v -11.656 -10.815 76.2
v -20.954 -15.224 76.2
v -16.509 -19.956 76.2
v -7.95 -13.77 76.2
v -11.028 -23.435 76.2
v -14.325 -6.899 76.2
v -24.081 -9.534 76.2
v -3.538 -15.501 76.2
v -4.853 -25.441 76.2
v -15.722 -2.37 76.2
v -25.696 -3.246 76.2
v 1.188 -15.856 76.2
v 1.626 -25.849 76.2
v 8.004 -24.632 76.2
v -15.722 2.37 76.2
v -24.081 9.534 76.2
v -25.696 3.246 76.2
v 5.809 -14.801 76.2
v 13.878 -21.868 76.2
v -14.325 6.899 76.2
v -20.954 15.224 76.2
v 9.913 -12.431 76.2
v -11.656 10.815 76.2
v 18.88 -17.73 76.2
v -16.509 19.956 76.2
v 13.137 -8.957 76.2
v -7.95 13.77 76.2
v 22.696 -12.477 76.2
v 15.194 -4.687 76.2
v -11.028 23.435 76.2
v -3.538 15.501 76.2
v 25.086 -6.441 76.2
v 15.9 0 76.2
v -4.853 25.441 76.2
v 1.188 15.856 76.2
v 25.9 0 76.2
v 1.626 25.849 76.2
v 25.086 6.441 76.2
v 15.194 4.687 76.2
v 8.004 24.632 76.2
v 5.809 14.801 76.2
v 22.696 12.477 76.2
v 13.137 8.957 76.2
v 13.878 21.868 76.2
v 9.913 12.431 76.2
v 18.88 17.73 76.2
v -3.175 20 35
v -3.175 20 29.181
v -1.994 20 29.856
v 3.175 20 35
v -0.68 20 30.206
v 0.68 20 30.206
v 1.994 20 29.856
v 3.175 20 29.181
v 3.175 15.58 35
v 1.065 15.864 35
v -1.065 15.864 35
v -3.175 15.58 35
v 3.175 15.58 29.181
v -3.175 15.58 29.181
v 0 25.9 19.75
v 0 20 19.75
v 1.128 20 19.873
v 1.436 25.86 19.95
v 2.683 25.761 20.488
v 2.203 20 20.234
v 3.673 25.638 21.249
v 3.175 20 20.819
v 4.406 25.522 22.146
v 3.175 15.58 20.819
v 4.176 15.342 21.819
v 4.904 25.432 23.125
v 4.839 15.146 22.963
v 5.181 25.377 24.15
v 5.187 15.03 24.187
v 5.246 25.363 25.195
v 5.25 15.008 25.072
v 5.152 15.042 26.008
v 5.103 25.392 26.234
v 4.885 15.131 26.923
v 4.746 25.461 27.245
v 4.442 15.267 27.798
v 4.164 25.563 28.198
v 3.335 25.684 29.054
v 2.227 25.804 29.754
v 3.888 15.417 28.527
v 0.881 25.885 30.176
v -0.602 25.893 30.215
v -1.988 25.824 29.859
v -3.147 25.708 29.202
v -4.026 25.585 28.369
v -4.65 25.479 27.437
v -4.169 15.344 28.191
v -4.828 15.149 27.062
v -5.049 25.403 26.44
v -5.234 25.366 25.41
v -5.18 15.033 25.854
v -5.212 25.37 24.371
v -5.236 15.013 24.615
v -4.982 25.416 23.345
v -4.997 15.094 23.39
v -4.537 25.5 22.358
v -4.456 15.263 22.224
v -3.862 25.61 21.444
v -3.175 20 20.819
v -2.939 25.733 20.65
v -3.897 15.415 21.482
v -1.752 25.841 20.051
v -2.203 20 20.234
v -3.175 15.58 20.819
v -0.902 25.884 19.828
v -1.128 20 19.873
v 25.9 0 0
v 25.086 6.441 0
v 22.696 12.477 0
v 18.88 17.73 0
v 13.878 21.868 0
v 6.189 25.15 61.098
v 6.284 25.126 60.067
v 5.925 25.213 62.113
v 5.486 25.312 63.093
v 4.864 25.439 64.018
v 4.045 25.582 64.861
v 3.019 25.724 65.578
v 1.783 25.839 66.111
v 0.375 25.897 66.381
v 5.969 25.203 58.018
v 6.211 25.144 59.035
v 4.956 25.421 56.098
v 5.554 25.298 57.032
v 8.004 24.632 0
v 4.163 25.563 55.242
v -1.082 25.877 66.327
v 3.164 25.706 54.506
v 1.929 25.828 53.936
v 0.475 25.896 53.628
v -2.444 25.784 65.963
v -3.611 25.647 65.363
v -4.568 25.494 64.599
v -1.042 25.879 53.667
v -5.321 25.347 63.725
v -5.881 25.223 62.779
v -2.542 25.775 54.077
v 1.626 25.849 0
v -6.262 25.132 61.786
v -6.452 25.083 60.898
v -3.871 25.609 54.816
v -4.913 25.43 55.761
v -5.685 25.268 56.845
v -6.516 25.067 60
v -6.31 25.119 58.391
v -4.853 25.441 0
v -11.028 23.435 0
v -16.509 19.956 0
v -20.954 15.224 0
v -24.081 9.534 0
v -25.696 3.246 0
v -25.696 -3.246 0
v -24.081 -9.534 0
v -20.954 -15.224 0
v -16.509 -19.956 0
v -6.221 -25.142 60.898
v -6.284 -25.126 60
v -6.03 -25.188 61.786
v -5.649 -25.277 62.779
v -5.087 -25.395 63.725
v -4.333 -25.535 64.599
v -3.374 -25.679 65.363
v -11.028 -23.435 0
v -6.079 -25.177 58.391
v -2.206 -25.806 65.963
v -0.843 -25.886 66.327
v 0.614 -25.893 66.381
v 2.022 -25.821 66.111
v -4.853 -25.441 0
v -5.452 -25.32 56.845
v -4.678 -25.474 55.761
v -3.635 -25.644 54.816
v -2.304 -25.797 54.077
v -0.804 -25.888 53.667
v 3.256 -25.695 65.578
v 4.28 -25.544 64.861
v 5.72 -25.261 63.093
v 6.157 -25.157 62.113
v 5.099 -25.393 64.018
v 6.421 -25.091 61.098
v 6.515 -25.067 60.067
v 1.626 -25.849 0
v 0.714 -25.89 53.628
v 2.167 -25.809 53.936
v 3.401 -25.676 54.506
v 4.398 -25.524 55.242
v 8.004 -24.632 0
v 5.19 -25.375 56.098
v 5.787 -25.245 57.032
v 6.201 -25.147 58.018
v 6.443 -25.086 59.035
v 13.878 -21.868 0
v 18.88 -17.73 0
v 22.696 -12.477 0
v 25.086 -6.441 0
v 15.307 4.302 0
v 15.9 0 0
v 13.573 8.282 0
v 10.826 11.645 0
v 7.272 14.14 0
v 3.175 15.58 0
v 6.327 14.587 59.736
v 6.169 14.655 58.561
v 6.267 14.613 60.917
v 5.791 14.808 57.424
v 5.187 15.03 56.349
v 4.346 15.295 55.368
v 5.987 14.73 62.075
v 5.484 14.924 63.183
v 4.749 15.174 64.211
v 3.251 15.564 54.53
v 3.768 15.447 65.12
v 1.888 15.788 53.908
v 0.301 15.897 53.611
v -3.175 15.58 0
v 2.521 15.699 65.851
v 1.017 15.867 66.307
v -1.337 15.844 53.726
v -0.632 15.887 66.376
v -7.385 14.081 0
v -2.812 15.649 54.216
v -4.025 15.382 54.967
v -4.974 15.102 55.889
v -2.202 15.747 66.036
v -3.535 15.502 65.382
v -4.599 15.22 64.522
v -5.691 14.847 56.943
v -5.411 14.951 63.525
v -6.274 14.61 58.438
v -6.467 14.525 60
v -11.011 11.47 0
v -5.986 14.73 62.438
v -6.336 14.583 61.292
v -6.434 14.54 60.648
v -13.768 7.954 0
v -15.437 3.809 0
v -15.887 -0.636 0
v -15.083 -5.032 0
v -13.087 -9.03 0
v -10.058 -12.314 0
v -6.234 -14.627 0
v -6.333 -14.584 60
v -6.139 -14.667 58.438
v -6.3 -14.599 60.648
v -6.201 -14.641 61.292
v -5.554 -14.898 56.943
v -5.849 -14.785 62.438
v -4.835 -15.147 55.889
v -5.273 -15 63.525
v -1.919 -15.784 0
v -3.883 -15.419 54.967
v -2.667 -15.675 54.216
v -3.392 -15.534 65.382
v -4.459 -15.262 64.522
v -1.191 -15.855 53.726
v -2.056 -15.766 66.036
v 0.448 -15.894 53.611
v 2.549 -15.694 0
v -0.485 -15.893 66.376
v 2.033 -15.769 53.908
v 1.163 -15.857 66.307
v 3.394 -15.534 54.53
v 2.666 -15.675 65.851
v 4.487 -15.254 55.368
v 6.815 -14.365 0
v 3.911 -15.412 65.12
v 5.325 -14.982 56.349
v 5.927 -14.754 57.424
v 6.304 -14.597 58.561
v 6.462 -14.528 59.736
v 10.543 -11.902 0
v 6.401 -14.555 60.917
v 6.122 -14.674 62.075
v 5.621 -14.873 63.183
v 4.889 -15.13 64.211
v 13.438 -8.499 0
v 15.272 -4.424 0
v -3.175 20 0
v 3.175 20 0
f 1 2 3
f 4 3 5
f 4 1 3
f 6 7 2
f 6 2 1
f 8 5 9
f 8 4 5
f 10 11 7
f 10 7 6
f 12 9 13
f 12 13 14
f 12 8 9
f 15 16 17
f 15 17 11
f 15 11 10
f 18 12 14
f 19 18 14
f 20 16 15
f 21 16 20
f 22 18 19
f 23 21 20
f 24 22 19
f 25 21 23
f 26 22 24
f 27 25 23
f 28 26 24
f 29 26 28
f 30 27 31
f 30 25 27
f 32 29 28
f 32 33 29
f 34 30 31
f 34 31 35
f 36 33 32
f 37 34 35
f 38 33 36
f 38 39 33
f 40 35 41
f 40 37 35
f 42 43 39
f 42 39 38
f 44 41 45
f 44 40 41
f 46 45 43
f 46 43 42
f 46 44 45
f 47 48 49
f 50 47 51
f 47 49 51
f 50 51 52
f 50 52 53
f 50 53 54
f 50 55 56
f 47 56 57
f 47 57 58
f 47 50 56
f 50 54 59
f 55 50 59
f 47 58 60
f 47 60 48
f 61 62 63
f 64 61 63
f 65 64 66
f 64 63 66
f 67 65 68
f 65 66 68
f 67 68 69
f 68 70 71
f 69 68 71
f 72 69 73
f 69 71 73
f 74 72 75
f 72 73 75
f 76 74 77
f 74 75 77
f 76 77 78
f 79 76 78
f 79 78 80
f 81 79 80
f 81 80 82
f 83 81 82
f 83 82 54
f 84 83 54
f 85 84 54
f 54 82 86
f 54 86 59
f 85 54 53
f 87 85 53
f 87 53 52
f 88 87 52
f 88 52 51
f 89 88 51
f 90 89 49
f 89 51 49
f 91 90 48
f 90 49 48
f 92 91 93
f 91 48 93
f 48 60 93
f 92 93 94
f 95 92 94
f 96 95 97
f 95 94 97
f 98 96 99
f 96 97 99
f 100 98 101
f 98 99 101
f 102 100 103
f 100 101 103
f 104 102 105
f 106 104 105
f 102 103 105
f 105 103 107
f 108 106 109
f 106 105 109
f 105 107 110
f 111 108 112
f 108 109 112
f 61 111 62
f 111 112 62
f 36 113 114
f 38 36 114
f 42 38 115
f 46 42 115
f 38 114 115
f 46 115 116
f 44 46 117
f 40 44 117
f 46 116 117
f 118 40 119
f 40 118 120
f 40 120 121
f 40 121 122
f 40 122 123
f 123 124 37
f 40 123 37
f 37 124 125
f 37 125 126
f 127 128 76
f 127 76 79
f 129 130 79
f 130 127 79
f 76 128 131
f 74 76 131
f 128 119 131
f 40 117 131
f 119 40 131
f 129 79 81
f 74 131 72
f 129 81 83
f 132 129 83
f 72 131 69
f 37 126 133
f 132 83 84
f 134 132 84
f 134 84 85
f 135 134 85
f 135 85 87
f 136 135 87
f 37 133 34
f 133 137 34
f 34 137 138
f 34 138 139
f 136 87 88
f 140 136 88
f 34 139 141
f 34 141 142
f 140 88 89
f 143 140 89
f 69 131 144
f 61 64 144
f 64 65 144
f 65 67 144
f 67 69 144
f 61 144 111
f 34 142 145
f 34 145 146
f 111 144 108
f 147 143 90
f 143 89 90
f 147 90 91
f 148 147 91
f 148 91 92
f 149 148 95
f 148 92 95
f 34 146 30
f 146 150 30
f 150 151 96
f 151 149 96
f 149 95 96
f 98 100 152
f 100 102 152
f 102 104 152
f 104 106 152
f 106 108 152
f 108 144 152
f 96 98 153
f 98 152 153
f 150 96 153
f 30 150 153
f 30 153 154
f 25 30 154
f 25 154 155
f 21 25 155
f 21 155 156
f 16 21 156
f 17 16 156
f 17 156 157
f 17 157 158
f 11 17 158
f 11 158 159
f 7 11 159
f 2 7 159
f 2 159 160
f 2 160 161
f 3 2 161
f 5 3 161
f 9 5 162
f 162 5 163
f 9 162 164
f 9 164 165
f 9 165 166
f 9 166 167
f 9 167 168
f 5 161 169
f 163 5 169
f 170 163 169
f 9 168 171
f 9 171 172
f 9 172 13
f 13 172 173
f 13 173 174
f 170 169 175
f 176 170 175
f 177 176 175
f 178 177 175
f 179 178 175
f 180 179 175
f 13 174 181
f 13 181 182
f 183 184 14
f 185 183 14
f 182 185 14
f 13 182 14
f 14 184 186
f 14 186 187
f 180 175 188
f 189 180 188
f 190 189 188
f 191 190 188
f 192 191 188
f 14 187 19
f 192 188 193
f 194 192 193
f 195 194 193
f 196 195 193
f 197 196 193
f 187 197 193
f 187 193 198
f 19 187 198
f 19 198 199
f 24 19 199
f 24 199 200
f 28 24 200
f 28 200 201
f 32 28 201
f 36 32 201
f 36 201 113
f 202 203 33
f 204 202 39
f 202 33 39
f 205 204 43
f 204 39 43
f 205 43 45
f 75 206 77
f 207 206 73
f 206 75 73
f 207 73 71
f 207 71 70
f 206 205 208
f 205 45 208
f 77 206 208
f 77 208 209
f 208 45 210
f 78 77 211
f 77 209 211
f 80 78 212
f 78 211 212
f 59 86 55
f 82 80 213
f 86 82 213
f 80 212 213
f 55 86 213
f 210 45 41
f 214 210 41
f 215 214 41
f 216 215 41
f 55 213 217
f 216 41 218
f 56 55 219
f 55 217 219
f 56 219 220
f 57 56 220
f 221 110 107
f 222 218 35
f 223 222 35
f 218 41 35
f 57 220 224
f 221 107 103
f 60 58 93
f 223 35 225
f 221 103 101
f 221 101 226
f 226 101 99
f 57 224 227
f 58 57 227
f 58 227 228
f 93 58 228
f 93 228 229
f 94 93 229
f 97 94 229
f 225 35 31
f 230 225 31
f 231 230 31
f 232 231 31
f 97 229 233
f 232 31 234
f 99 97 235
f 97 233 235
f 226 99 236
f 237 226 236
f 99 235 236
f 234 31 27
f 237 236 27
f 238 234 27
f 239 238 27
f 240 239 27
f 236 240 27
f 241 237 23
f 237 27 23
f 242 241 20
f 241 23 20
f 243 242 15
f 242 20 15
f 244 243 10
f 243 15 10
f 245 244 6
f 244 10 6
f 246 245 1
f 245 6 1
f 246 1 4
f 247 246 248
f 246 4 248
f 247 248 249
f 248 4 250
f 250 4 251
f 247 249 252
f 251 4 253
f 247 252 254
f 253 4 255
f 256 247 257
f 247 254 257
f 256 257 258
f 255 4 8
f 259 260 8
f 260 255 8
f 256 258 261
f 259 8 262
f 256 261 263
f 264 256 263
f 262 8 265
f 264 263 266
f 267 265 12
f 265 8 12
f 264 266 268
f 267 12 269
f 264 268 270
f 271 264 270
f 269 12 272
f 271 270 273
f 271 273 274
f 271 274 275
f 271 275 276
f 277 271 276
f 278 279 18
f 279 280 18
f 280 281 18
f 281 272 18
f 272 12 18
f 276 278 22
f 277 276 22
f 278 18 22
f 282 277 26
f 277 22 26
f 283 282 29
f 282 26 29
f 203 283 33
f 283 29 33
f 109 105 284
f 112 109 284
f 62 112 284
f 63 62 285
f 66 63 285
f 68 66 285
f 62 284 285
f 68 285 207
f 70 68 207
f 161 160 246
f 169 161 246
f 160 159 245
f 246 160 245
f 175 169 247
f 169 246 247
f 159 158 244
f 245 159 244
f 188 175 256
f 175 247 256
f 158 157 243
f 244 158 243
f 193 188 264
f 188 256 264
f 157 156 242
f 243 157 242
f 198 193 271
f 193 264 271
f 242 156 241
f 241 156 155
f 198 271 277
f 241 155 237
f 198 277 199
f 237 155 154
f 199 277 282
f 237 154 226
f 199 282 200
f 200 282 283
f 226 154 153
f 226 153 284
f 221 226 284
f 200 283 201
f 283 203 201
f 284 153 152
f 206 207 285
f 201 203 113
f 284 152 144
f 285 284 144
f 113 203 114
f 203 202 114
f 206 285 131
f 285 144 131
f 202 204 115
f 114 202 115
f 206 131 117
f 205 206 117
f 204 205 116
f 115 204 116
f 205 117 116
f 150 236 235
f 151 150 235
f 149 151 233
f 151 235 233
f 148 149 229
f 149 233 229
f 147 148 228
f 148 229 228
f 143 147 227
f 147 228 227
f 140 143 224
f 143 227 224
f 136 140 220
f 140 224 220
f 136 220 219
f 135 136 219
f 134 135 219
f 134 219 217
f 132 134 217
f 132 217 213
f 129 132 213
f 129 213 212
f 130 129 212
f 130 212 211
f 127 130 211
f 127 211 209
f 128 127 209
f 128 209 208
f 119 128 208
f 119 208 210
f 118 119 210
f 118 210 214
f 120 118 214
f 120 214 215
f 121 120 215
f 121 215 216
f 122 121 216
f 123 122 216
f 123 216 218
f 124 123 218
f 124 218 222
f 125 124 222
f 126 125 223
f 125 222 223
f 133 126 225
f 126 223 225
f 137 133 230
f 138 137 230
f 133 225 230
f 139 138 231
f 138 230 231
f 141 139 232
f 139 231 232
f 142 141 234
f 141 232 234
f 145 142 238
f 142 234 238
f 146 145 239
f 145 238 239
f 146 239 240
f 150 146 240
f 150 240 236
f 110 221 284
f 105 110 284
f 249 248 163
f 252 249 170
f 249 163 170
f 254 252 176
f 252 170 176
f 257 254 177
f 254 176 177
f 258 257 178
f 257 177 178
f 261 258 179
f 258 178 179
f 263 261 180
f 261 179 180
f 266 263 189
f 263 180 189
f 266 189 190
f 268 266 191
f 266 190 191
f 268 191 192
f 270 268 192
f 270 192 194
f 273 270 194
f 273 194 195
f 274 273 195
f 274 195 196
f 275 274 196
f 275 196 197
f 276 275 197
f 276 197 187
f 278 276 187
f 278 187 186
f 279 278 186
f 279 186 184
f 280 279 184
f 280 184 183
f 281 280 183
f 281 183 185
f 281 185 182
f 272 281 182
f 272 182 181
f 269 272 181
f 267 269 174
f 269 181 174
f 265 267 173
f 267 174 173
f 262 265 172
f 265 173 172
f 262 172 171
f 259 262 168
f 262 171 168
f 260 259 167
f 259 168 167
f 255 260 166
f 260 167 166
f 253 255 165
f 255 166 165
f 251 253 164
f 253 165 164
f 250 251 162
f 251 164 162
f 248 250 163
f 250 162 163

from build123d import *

# Parameters (mm, degrees)
SKETCH1_R                        = 25.9
BOSS_EXTRUDE1_DEPTH              = 76.2
SKETCH2_R                        = 15.9
CUT_EXTRUDE1_DEPTH               = 77.2
F_10_5_10_5_DIAMETER_HOLE1_D     = 10.5
F_10_5_10_5_DIAMETER_HOLE1_DEPTH = 20
F_10_5_10_5_DIAMETER_HOLE1_TIP   = 3.15451825
F_12_8_12_8_DIAMETER_HOLE1_D     = 12.8
F_12_8_12_8_DIAMETER_HOLE1_DEPTH = 300
F_12_8_12_8_DIAMETER_HOLE1_TIP   = 3.845507962
CUT_EXTRUDE2_DEPTH               = 35


with BuildPart() as part:
    # Sketch1 → Boss-Extrude1 (new body)
    with BuildSketch(Plane.XY):
        Circle(SKETCH1_R)
    extrude(amount=BOSS_EXTRUDE1_DEPTH)

    # Sketch2 → Cut-Extrude1 (cut, through all)
    with BuildSketch(Plane.XY.offset(76.2)):
        Circle(SKETCH2_R)
    extrude(amount=-CUT_EXTRUDE1_DEPTH, mode=Mode.SUBTRACT)

    # Ø10.5 (10.5) Diameter Hole1
    with Locations(Plane(origin=(0, 25.9, 25), x_dir=(0, 0, 1), z_dir=(0, 1, 0))):
        with Locations((0, 0)):
            Hole(F_10_5_10_5_DIAMETER_HOLE1_D / 2, depth=F_10_5_10_5_DIAMETER_HOLE1_DEPTH)
            with Locations((0, 0, -(F_10_5_10_5_DIAMETER_HOLE1_DEPTH + F_10_5_10_5_DIAMETER_HOLE1_TIP / 2))):  # 118° drill point
                Cone(0, F_10_5_10_5_DIAMETER_HOLE1_D / 2, F_10_5_10_5_DIAMETER_HOLE1_TIP, mode=Mode.SUBTRACT)

    # Ø12.8 (12.8) Diameter Hole1
    with Locations(Plane(origin=(-0.119429255, 25.899724644, 60), x_dir=(0.999989369, 0.004611168, 0), z_dir=(-0.004611168, 0.999989369, 0))):
        with Locations((0, 0)):
            Hole(F_12_8_12_8_DIAMETER_HOLE1_D / 2, depth=F_12_8_12_8_DIAMETER_HOLE1_DEPTH)
            with Locations((0, 0, -(F_12_8_12_8_DIAMETER_HOLE1_DEPTH + F_12_8_12_8_DIAMETER_HOLE1_TIP / 2))):  # 118° drill point
                Cone(0, F_12_8_12_8_DIAMETER_HOLE1_D / 2, F_12_8_12_8_DIAMETER_HOLE1_TIP, mode=Mode.SUBTRACT)

    # Sketch5 → Cut-Extrude2 (cut)
    with BuildSketch(Plane(origin=(0, 0, 0), x_dir=(-1, 0, 0), z_dir=(0, 0, -1))):
        with BuildLine():
            Line((-3.175, 20), (-3.175, 15.579774549))
            ThreePointArc((-3.175, 15.579774549), (0, 15.9), (3.175, 15.579774549))
            Line((3.175, 15.579774549), (3.175, 20))
            Line((3.175, 20), (-3.175, 20))
        make_face()
    extrude(amount=-CUT_EXTRUDE2_DEPTH, mode=Mode.SUBTRACT)


solid = part.part
